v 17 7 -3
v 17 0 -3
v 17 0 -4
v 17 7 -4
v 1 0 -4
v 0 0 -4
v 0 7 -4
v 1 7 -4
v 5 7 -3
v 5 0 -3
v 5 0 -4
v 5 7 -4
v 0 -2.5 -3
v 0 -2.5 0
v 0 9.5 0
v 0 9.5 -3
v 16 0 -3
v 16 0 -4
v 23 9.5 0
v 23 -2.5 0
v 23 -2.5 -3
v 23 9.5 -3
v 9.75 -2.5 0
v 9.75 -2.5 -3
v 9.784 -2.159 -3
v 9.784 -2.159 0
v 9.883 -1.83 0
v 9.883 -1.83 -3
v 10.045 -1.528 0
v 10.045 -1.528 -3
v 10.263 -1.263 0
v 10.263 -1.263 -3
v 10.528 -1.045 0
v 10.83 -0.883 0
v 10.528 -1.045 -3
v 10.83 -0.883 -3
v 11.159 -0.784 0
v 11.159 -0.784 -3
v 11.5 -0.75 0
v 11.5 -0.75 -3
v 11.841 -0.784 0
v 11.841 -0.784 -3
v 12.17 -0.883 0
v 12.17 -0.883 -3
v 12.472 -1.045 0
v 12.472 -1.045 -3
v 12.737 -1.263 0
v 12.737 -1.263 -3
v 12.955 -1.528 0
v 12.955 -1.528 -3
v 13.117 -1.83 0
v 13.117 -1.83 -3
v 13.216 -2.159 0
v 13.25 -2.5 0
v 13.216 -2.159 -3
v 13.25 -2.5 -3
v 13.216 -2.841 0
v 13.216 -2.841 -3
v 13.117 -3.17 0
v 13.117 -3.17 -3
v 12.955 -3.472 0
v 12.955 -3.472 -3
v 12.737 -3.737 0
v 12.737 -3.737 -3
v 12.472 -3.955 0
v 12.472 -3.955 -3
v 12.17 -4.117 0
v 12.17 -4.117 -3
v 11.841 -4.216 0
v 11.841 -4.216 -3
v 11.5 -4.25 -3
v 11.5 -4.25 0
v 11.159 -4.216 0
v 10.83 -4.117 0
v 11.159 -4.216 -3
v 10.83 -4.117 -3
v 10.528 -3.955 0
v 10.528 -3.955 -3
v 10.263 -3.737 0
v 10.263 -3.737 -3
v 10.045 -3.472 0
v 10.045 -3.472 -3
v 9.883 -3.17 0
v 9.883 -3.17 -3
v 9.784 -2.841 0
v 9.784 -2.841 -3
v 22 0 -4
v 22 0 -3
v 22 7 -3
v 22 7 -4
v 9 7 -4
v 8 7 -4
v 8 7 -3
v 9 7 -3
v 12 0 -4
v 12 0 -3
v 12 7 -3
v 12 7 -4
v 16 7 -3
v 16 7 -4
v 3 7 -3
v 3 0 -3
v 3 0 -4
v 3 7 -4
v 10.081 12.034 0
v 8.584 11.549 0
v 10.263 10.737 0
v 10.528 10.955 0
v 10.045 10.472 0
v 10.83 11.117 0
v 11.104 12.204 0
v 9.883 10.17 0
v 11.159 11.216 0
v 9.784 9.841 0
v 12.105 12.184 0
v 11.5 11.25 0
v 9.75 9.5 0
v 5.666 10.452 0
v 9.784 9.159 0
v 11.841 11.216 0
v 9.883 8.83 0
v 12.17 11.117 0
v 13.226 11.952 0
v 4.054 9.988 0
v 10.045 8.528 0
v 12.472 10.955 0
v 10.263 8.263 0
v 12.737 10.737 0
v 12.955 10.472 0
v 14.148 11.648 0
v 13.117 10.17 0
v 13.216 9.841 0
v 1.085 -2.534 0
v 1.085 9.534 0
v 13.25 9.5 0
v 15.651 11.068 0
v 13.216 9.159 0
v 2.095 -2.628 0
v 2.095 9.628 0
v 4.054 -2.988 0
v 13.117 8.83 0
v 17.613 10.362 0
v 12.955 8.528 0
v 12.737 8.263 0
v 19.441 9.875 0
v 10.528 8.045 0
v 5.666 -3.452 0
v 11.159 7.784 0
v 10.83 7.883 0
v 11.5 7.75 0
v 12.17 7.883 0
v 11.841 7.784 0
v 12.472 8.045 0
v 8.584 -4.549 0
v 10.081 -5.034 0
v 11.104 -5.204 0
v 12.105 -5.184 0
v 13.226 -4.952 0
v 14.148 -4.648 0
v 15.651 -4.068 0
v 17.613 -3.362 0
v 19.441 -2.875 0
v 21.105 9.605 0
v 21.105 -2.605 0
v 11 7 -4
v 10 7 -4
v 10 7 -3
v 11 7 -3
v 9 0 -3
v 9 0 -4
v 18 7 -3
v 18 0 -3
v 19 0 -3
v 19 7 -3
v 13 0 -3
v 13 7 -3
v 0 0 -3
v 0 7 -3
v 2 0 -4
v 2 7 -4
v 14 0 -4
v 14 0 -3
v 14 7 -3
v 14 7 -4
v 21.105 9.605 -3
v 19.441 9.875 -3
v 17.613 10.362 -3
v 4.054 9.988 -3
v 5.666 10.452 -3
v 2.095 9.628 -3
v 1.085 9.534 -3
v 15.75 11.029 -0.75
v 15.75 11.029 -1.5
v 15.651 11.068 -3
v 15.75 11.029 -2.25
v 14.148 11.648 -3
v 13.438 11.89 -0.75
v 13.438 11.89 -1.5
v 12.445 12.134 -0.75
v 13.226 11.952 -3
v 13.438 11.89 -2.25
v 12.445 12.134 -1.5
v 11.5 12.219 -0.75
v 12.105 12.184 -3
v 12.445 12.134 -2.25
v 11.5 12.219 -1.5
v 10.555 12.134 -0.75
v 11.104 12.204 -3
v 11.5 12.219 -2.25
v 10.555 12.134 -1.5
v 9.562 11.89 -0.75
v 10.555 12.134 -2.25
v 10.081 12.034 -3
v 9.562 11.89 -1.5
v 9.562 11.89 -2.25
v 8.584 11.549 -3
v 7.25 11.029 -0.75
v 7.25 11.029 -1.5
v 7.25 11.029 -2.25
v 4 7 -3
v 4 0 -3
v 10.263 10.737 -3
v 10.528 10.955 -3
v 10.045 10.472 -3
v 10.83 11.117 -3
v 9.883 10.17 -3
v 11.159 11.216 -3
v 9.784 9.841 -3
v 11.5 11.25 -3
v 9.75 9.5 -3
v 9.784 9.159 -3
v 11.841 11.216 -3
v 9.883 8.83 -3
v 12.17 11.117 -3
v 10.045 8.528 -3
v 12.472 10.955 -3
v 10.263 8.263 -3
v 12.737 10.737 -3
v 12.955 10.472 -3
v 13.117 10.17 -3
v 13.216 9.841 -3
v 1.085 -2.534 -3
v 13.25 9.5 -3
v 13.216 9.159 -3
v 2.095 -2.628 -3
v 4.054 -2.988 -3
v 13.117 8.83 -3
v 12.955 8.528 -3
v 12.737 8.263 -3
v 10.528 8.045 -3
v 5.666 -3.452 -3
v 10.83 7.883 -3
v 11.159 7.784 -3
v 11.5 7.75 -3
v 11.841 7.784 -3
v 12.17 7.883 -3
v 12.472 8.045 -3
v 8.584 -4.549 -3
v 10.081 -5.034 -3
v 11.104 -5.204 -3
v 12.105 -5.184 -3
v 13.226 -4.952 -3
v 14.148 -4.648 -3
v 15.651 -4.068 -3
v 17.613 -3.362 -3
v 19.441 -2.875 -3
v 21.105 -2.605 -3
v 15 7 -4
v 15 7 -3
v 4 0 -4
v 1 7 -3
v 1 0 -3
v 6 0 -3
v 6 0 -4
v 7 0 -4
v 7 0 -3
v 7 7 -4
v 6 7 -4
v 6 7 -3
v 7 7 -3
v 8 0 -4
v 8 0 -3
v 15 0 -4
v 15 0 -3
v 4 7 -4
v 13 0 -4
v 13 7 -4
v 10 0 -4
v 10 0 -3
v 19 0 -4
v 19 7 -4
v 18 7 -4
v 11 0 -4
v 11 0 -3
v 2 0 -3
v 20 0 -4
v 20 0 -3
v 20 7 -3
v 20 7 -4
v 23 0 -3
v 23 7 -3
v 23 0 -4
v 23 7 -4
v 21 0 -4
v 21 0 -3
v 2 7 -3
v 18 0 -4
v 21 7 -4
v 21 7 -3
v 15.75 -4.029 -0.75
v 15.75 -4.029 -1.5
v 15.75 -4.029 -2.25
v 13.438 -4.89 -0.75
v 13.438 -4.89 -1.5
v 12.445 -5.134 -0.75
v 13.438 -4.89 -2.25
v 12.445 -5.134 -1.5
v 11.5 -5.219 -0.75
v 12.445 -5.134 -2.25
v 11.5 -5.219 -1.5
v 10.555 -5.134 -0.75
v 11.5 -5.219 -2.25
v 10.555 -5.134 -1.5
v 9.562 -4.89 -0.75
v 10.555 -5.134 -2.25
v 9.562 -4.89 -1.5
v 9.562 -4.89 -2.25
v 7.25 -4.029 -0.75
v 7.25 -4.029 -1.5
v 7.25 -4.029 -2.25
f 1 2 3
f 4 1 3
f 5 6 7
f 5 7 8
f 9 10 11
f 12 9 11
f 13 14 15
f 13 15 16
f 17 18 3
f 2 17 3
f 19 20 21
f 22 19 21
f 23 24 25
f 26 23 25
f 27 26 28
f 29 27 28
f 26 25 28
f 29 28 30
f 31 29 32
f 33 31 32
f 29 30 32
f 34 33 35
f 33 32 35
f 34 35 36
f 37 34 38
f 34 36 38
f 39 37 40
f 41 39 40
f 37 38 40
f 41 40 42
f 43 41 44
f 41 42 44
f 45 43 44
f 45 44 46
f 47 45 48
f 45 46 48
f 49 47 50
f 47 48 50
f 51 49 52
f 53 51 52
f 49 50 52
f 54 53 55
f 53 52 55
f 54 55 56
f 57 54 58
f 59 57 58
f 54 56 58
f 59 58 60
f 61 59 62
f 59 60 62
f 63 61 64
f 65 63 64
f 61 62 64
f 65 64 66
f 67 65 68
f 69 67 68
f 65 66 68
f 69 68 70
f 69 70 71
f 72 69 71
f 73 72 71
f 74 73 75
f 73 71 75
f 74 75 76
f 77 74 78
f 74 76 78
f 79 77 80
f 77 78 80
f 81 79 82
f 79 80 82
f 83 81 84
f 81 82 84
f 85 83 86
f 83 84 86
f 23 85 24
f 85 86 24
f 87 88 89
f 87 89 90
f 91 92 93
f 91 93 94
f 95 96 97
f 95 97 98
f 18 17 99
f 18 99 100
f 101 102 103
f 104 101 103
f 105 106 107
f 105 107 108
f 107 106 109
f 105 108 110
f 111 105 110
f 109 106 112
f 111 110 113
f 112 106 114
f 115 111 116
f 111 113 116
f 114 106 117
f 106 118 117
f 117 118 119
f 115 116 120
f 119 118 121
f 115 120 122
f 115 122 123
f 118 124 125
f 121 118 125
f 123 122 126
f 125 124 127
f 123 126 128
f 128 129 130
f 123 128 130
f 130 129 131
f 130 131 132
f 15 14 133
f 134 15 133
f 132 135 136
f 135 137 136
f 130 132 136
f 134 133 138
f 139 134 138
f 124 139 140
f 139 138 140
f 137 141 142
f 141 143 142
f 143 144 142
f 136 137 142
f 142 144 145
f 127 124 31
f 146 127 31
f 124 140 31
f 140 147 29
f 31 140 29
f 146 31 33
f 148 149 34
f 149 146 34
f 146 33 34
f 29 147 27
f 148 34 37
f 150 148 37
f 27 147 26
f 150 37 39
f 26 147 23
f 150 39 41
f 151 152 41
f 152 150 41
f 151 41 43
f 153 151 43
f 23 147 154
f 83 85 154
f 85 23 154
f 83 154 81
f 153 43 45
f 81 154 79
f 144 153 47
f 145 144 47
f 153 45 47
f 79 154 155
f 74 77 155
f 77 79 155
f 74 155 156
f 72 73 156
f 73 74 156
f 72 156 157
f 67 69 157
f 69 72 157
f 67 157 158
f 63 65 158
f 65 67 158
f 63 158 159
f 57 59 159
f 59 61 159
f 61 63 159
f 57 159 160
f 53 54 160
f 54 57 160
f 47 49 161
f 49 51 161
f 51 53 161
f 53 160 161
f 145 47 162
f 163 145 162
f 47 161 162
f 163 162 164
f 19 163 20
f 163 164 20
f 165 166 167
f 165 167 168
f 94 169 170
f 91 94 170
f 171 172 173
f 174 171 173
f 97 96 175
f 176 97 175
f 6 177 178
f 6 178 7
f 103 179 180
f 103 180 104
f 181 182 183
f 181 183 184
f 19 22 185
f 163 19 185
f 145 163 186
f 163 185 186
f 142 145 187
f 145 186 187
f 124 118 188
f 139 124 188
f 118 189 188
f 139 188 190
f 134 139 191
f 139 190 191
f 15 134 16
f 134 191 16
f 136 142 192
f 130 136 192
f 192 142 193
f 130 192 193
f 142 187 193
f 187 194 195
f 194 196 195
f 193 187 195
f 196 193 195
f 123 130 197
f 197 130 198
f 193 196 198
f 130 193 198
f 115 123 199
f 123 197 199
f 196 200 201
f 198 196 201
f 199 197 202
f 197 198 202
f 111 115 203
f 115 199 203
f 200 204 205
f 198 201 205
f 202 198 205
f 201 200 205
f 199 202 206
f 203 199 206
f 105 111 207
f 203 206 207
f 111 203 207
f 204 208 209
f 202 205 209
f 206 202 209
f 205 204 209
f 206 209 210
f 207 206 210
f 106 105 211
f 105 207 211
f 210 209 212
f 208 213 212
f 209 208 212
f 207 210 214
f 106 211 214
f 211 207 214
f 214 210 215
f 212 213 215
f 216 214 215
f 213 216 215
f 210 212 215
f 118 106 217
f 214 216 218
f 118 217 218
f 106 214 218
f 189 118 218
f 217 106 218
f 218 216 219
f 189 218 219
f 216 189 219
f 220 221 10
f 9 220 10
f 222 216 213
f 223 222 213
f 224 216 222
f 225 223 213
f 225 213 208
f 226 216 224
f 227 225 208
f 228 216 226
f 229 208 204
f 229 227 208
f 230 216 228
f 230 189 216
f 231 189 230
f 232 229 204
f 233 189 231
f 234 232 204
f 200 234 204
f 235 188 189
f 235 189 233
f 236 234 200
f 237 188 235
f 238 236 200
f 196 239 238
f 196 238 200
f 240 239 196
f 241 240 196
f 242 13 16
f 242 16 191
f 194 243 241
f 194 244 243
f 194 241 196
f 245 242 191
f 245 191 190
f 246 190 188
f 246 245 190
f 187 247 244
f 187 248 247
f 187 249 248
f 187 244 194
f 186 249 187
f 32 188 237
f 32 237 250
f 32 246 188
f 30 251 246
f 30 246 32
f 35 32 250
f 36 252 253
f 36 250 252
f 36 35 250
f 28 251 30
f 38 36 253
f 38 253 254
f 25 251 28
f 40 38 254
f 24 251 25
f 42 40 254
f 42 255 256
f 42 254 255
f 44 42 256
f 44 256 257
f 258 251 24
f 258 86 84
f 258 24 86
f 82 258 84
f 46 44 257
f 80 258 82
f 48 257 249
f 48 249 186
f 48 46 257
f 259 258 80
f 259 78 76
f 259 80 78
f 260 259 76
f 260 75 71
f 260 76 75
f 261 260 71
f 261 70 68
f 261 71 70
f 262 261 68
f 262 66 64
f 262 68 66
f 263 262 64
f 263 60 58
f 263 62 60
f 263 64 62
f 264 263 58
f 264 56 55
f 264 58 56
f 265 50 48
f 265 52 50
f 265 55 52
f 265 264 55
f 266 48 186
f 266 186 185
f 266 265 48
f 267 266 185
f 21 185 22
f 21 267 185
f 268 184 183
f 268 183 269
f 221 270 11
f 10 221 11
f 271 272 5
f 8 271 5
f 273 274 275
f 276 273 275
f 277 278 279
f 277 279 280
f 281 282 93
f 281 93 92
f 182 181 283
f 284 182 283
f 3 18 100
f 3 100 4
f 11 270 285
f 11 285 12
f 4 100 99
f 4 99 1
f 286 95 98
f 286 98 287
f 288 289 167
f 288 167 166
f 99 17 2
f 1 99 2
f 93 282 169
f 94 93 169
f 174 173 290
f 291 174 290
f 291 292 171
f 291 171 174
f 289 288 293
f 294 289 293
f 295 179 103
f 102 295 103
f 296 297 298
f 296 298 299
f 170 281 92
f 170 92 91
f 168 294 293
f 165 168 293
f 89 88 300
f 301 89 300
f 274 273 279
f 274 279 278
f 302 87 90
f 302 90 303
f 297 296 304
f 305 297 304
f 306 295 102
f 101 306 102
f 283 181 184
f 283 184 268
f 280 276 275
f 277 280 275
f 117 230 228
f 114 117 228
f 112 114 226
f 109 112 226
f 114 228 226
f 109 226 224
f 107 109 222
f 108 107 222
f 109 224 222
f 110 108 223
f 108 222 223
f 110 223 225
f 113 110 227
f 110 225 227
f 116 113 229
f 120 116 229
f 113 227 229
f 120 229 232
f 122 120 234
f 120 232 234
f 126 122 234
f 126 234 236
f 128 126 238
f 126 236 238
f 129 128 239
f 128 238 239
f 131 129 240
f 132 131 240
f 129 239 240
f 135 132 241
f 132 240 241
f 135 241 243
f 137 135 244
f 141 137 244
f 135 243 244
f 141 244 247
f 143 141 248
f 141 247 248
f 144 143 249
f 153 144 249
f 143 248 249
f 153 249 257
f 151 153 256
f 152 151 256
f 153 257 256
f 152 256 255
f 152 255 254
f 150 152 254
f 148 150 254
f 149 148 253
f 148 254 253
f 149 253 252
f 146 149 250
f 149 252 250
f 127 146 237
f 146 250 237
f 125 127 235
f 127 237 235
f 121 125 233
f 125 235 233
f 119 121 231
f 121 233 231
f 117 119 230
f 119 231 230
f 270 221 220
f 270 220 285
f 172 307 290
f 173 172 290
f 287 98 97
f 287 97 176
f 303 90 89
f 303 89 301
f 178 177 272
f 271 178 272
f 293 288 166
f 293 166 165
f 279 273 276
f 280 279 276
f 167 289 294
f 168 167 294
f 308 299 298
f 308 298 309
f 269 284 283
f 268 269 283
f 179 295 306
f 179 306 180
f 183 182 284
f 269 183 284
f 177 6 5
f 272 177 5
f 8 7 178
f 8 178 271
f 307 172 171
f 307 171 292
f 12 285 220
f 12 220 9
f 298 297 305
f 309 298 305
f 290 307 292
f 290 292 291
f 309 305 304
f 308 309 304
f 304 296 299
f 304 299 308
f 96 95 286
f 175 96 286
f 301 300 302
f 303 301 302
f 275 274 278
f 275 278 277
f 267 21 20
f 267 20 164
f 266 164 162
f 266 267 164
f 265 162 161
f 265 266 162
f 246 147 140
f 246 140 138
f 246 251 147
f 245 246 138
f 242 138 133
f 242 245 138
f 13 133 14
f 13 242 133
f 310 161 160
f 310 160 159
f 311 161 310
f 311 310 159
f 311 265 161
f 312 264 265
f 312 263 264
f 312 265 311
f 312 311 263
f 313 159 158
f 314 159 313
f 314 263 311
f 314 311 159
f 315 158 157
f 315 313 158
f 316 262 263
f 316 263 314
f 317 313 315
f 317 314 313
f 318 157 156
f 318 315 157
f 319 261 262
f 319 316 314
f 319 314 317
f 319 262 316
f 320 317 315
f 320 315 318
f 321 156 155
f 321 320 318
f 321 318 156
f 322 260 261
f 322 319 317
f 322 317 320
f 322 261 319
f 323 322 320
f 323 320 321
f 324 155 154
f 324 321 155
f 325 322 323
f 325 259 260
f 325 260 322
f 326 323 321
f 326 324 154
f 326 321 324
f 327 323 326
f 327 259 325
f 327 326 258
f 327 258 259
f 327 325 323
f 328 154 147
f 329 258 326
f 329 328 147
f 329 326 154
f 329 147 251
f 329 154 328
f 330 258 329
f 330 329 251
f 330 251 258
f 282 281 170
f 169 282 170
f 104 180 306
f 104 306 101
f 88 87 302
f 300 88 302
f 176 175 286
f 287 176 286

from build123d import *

# Parameters (mm, degrees)
ESQUISSE2_W             = 1
ESQUISSE2_H             = 1
BOSS_EXTRU_1_DEPTH      = 7
BOSS_EXTRU_1_2_DEPTH    = 7
BOSS_EXTRU_1_3_DEPTH    = 7
BOSS_EXTRU_1_4_DEPTH    = 7
BOSS_EXTRU_1_5_DEPTH    = 7
BOSS_EXTRU_1_6_DEPTH    = 7
BOSS_EXTRU_1_7_DEPTH    = 7
BOSS_EXTRU_1_8_DEPTH    = 7
BOSS_EXTRU_1_9_DEPTH    = 7
BOSS_EXTRU_1_10_DEPTH   = 7
BOSS_EXTRU_1_11_DEPTH   = 7
BOSS_EXTRU_1_12_DEPTH   = 7
BOSS_EXTRU_2_DEPTH      = 6
BOSS_EXTRU_2_DEPTH_BACK = 13
ESQUISSE3_W             = 23
ESQUISSE3_H             = 3
ESQUISSE4_R             = 1.75
ENL_V_MAT_EXTRU_1_DEPTH = 3


with BuildPart() as part:
    # Esquisse2 → Boss.-Extru.1 (new body)
    with BuildSketch(Plane(origin=(0, 0, 0), x_dir=(1, 0, 0), z_dir=(0, 1, 0))):
        with Locations((0.5, 3.5)):
            Rectangle(ESQUISSE2_W, ESQUISSE2_H)
    extrude(amount=BOSS_EXTRU_1_DEPTH)


with BuildPart() as body_2:
    # Esquisse2 → Boss.-Extru.1 2 (new body)
    with BuildSketch(Plane(origin=(0, 0, 0), x_dir=(1, 0, 0), z_dir=(0, 1, 0))):
        with Locations((4.5, 3.5)):
            Rectangle(ESQUISSE2_W, ESQUISSE2_H)
    extrude(amount=BOSS_EXTRU_1_2_DEPTH)


with BuildPart() as body_3:
    # Esquisse2 → Boss.-Extru.1 3 (new body)
    with BuildSketch(Plane(origin=(0, 0, 0), x_dir=(1, 0, 0), z_dir=(0, 1, 0))):
        with Locations((6.5, 3.5)):
            Rectangle(ESQUISSE2_W, ESQUISSE2_H)
    extrude(amount=BOSS_EXTRU_1_3_DEPTH)


with BuildPart() as body_4:
    # Esquisse2 → Boss.-Extru.1 4 (new body)
    with BuildSketch(Plane(origin=(0, 0, 0), x_dir=(1, 0, 0), z_dir=(0, 1, 0))):
        with Locations((8.5, 3.5)):
            Rectangle(ESQUISSE2_W, ESQUISSE2_H)
    extrude(amount=BOSS_EXTRU_1_4_DEPTH)


with BuildPart() as body_5:
    # Esquisse2 → Boss.-Extru.1 5 (new body)
    with BuildSketch(Plane(origin=(0, 0, 0), x_dir=(1, 0, 0), z_dir=(0, 1, 0))):
        with Locations((10.5, 3.5)):
            Rectangle(ESQUISSE2_W, ESQUISSE2_H)
    extrude(amount=BOSS_EXTRU_1_5_DEPTH)


with BuildPart() as body_6:
    # Esquisse2 → Boss.-Extru.1 6 (new body)
    with BuildSketch(Plane(origin=(0, 0, 0), x_dir=(1, 0, 0), z_dir=(0, 1, 0))):
        with Locations((12.5, 3.5)):
            Rectangle(ESQUISSE2_W, ESQUISSE2_H)
    extrude(amount=BOSS_EXTRU_1_6_DEPTH)


with BuildPart() as body_7:
    # Esquisse2 → Boss.-Extru.1 7 (new body)
    with BuildSketch(Plane(origin=(0, 0, 0), x_dir=(1, 0, 0), z_dir=(0, 1, 0))):
        with Locations((14.5, 3.5)):
            Rectangle(ESQUISSE2_W, ESQUISSE2_H)
    extrude(amount=BOSS_EXTRU_1_7_DEPTH)


with BuildPart() as body_8:
    # Esquisse2 → Boss.-Extru.1 8 (new body)
    with BuildSketch(Plane(origin=(0, 0, 0), x_dir=(1, 0, 0), z_dir=(0, 1, 0))):
        with Locations((16.5, 3.5)):
            Rectangle(ESQUISSE2_W, ESQUISSE2_H)
    extrude(amount=BOSS_EXTRU_1_8_DEPTH)


with BuildPart() as body_9:
    # Esquisse2 → Boss.-Extru.1 9 (new body)
    with BuildSketch(Plane(origin=(0, 0, 0), x_dir=(1, 0, 0), z_dir=(0, 1, 0))):
        with Locations((18.5, 3.5)):
            Rectangle(ESQUISSE2_W, ESQUISSE2_H)
    extrude(amount=BOSS_EXTRU_1_9_DEPTH)


with BuildPart() as body_10:
    # Esquisse2 → Boss.-Extru.1 10 (new body)
    with BuildSketch(Plane(origin=(0, 0, 0), x_dir=(1, 0, 0), z_dir=(0, 1, 0))):
        with Locations((20.5, 3.5)):
            Rectangle(ESQUISSE2_W, ESQUISSE2_H)
    extrude(amount=BOSS_EXTRU_1_10_DEPTH)


with BuildPart() as body_11:
    # Esquisse2 → Boss.-Extru.1 11 (new body)
    with BuildSketch(Plane(origin=(0, 0, 0), x_dir=(1, 0, 0), z_dir=(0, 1, 0))):
        with Locations((22.5, 3.5)):
            Rectangle(ESQUISSE2_W, ESQUISSE2_H)
    extrude(amount=BOSS_EXTRU_1_11_DEPTH)


with BuildPart() as body_12:
    # Esquisse2 → Boss.-Extru.1 12 (new body)
    with BuildSketch(Plane(origin=(0, 0, 0), x_dir=(1, 0, 0), z_dir=(0, 1, 0))):
        with Locations((2.5, 3.5)):
            Rectangle(ESQUISSE2_W, ESQUISSE2_H)
    extrude(amount=BOSS_EXTRU_1_12_DEPTH)


with BuildPart() as body_13:
    # Esquisse3 → Boss.-Extru.2 (new, two sides: drawn at the far end of the back side and taken through both)
    with BuildSketch(Plane(origin=(0, 7, 0), x_dir=(1, 0, 0), z_dir=(0, 1, 0)).offset(-BOSS_EXTRU_2_DEPTH_BACK)):
        with Locations((11.5, 1.5)):
            Rectangle(ESQUISSE3_W, ESQUISSE3_H)
    extrude(amount=BOSS_EXTRU_2_DEPTH + BOSS_EXTRU_2_DEPTH_BACK)

    # Esquisse4 → Enlèv. mat.-Extru.1 (cut)
    with BuildSketch(Plane(origin=(0, 0, -3), x_dir=(-1, 0, 0), z_dir=(0, 0, -1))):
        with Locations((-11.5, -2.5)):
            Circle(ESQUISSE4_R)
        with Locations((-11.5, 9.5)):
            Circle(ESQUISSE4_R)
        with BuildLine():
            Line((-23, 9.5), (-23, 13))
            Line((-23, 13), (0, 13))
            Line((0, 13), (0, 9.5))
            add(Edge.make_bspline(
                [(-23, 9.5), (-13.25, 9.5), (-11.5, 16.75), (-9.75, 9.5), (0, 9.5)],
                knots=[0, 0, 0, 0, 0, 1, 1, 1, 1, 1], degree=4))
        make_face()
        with BuildLine():
            Line((-23, -6), (0, -6))
            Line((0, -6), (0, -2.5))
            add(Edge.make_bspline(
                [(-23, -2.5), (-13.25, -2.5), (-11.5, -9.75), (-9.75, -2.5), (0, -2.5)],
                knots=[0, 0, 0, 0, 0, 1, 1, 1, 1, 1], degree=4))
            Line((-23, -2.5), (-23, -6))
        make_face()
    extrude(amount=-ENL_V_MAT_EXTRU_1_DEPTH, mode=Mode.SUBTRACT)


solid = Compound([part.part, body_2.part, body_3.part, body_4.part, body_5.part, body_6.part, body_7.part, body_8.part, body_9.part, body_10.part, body_11.part, body_12.part, body_13.part])
